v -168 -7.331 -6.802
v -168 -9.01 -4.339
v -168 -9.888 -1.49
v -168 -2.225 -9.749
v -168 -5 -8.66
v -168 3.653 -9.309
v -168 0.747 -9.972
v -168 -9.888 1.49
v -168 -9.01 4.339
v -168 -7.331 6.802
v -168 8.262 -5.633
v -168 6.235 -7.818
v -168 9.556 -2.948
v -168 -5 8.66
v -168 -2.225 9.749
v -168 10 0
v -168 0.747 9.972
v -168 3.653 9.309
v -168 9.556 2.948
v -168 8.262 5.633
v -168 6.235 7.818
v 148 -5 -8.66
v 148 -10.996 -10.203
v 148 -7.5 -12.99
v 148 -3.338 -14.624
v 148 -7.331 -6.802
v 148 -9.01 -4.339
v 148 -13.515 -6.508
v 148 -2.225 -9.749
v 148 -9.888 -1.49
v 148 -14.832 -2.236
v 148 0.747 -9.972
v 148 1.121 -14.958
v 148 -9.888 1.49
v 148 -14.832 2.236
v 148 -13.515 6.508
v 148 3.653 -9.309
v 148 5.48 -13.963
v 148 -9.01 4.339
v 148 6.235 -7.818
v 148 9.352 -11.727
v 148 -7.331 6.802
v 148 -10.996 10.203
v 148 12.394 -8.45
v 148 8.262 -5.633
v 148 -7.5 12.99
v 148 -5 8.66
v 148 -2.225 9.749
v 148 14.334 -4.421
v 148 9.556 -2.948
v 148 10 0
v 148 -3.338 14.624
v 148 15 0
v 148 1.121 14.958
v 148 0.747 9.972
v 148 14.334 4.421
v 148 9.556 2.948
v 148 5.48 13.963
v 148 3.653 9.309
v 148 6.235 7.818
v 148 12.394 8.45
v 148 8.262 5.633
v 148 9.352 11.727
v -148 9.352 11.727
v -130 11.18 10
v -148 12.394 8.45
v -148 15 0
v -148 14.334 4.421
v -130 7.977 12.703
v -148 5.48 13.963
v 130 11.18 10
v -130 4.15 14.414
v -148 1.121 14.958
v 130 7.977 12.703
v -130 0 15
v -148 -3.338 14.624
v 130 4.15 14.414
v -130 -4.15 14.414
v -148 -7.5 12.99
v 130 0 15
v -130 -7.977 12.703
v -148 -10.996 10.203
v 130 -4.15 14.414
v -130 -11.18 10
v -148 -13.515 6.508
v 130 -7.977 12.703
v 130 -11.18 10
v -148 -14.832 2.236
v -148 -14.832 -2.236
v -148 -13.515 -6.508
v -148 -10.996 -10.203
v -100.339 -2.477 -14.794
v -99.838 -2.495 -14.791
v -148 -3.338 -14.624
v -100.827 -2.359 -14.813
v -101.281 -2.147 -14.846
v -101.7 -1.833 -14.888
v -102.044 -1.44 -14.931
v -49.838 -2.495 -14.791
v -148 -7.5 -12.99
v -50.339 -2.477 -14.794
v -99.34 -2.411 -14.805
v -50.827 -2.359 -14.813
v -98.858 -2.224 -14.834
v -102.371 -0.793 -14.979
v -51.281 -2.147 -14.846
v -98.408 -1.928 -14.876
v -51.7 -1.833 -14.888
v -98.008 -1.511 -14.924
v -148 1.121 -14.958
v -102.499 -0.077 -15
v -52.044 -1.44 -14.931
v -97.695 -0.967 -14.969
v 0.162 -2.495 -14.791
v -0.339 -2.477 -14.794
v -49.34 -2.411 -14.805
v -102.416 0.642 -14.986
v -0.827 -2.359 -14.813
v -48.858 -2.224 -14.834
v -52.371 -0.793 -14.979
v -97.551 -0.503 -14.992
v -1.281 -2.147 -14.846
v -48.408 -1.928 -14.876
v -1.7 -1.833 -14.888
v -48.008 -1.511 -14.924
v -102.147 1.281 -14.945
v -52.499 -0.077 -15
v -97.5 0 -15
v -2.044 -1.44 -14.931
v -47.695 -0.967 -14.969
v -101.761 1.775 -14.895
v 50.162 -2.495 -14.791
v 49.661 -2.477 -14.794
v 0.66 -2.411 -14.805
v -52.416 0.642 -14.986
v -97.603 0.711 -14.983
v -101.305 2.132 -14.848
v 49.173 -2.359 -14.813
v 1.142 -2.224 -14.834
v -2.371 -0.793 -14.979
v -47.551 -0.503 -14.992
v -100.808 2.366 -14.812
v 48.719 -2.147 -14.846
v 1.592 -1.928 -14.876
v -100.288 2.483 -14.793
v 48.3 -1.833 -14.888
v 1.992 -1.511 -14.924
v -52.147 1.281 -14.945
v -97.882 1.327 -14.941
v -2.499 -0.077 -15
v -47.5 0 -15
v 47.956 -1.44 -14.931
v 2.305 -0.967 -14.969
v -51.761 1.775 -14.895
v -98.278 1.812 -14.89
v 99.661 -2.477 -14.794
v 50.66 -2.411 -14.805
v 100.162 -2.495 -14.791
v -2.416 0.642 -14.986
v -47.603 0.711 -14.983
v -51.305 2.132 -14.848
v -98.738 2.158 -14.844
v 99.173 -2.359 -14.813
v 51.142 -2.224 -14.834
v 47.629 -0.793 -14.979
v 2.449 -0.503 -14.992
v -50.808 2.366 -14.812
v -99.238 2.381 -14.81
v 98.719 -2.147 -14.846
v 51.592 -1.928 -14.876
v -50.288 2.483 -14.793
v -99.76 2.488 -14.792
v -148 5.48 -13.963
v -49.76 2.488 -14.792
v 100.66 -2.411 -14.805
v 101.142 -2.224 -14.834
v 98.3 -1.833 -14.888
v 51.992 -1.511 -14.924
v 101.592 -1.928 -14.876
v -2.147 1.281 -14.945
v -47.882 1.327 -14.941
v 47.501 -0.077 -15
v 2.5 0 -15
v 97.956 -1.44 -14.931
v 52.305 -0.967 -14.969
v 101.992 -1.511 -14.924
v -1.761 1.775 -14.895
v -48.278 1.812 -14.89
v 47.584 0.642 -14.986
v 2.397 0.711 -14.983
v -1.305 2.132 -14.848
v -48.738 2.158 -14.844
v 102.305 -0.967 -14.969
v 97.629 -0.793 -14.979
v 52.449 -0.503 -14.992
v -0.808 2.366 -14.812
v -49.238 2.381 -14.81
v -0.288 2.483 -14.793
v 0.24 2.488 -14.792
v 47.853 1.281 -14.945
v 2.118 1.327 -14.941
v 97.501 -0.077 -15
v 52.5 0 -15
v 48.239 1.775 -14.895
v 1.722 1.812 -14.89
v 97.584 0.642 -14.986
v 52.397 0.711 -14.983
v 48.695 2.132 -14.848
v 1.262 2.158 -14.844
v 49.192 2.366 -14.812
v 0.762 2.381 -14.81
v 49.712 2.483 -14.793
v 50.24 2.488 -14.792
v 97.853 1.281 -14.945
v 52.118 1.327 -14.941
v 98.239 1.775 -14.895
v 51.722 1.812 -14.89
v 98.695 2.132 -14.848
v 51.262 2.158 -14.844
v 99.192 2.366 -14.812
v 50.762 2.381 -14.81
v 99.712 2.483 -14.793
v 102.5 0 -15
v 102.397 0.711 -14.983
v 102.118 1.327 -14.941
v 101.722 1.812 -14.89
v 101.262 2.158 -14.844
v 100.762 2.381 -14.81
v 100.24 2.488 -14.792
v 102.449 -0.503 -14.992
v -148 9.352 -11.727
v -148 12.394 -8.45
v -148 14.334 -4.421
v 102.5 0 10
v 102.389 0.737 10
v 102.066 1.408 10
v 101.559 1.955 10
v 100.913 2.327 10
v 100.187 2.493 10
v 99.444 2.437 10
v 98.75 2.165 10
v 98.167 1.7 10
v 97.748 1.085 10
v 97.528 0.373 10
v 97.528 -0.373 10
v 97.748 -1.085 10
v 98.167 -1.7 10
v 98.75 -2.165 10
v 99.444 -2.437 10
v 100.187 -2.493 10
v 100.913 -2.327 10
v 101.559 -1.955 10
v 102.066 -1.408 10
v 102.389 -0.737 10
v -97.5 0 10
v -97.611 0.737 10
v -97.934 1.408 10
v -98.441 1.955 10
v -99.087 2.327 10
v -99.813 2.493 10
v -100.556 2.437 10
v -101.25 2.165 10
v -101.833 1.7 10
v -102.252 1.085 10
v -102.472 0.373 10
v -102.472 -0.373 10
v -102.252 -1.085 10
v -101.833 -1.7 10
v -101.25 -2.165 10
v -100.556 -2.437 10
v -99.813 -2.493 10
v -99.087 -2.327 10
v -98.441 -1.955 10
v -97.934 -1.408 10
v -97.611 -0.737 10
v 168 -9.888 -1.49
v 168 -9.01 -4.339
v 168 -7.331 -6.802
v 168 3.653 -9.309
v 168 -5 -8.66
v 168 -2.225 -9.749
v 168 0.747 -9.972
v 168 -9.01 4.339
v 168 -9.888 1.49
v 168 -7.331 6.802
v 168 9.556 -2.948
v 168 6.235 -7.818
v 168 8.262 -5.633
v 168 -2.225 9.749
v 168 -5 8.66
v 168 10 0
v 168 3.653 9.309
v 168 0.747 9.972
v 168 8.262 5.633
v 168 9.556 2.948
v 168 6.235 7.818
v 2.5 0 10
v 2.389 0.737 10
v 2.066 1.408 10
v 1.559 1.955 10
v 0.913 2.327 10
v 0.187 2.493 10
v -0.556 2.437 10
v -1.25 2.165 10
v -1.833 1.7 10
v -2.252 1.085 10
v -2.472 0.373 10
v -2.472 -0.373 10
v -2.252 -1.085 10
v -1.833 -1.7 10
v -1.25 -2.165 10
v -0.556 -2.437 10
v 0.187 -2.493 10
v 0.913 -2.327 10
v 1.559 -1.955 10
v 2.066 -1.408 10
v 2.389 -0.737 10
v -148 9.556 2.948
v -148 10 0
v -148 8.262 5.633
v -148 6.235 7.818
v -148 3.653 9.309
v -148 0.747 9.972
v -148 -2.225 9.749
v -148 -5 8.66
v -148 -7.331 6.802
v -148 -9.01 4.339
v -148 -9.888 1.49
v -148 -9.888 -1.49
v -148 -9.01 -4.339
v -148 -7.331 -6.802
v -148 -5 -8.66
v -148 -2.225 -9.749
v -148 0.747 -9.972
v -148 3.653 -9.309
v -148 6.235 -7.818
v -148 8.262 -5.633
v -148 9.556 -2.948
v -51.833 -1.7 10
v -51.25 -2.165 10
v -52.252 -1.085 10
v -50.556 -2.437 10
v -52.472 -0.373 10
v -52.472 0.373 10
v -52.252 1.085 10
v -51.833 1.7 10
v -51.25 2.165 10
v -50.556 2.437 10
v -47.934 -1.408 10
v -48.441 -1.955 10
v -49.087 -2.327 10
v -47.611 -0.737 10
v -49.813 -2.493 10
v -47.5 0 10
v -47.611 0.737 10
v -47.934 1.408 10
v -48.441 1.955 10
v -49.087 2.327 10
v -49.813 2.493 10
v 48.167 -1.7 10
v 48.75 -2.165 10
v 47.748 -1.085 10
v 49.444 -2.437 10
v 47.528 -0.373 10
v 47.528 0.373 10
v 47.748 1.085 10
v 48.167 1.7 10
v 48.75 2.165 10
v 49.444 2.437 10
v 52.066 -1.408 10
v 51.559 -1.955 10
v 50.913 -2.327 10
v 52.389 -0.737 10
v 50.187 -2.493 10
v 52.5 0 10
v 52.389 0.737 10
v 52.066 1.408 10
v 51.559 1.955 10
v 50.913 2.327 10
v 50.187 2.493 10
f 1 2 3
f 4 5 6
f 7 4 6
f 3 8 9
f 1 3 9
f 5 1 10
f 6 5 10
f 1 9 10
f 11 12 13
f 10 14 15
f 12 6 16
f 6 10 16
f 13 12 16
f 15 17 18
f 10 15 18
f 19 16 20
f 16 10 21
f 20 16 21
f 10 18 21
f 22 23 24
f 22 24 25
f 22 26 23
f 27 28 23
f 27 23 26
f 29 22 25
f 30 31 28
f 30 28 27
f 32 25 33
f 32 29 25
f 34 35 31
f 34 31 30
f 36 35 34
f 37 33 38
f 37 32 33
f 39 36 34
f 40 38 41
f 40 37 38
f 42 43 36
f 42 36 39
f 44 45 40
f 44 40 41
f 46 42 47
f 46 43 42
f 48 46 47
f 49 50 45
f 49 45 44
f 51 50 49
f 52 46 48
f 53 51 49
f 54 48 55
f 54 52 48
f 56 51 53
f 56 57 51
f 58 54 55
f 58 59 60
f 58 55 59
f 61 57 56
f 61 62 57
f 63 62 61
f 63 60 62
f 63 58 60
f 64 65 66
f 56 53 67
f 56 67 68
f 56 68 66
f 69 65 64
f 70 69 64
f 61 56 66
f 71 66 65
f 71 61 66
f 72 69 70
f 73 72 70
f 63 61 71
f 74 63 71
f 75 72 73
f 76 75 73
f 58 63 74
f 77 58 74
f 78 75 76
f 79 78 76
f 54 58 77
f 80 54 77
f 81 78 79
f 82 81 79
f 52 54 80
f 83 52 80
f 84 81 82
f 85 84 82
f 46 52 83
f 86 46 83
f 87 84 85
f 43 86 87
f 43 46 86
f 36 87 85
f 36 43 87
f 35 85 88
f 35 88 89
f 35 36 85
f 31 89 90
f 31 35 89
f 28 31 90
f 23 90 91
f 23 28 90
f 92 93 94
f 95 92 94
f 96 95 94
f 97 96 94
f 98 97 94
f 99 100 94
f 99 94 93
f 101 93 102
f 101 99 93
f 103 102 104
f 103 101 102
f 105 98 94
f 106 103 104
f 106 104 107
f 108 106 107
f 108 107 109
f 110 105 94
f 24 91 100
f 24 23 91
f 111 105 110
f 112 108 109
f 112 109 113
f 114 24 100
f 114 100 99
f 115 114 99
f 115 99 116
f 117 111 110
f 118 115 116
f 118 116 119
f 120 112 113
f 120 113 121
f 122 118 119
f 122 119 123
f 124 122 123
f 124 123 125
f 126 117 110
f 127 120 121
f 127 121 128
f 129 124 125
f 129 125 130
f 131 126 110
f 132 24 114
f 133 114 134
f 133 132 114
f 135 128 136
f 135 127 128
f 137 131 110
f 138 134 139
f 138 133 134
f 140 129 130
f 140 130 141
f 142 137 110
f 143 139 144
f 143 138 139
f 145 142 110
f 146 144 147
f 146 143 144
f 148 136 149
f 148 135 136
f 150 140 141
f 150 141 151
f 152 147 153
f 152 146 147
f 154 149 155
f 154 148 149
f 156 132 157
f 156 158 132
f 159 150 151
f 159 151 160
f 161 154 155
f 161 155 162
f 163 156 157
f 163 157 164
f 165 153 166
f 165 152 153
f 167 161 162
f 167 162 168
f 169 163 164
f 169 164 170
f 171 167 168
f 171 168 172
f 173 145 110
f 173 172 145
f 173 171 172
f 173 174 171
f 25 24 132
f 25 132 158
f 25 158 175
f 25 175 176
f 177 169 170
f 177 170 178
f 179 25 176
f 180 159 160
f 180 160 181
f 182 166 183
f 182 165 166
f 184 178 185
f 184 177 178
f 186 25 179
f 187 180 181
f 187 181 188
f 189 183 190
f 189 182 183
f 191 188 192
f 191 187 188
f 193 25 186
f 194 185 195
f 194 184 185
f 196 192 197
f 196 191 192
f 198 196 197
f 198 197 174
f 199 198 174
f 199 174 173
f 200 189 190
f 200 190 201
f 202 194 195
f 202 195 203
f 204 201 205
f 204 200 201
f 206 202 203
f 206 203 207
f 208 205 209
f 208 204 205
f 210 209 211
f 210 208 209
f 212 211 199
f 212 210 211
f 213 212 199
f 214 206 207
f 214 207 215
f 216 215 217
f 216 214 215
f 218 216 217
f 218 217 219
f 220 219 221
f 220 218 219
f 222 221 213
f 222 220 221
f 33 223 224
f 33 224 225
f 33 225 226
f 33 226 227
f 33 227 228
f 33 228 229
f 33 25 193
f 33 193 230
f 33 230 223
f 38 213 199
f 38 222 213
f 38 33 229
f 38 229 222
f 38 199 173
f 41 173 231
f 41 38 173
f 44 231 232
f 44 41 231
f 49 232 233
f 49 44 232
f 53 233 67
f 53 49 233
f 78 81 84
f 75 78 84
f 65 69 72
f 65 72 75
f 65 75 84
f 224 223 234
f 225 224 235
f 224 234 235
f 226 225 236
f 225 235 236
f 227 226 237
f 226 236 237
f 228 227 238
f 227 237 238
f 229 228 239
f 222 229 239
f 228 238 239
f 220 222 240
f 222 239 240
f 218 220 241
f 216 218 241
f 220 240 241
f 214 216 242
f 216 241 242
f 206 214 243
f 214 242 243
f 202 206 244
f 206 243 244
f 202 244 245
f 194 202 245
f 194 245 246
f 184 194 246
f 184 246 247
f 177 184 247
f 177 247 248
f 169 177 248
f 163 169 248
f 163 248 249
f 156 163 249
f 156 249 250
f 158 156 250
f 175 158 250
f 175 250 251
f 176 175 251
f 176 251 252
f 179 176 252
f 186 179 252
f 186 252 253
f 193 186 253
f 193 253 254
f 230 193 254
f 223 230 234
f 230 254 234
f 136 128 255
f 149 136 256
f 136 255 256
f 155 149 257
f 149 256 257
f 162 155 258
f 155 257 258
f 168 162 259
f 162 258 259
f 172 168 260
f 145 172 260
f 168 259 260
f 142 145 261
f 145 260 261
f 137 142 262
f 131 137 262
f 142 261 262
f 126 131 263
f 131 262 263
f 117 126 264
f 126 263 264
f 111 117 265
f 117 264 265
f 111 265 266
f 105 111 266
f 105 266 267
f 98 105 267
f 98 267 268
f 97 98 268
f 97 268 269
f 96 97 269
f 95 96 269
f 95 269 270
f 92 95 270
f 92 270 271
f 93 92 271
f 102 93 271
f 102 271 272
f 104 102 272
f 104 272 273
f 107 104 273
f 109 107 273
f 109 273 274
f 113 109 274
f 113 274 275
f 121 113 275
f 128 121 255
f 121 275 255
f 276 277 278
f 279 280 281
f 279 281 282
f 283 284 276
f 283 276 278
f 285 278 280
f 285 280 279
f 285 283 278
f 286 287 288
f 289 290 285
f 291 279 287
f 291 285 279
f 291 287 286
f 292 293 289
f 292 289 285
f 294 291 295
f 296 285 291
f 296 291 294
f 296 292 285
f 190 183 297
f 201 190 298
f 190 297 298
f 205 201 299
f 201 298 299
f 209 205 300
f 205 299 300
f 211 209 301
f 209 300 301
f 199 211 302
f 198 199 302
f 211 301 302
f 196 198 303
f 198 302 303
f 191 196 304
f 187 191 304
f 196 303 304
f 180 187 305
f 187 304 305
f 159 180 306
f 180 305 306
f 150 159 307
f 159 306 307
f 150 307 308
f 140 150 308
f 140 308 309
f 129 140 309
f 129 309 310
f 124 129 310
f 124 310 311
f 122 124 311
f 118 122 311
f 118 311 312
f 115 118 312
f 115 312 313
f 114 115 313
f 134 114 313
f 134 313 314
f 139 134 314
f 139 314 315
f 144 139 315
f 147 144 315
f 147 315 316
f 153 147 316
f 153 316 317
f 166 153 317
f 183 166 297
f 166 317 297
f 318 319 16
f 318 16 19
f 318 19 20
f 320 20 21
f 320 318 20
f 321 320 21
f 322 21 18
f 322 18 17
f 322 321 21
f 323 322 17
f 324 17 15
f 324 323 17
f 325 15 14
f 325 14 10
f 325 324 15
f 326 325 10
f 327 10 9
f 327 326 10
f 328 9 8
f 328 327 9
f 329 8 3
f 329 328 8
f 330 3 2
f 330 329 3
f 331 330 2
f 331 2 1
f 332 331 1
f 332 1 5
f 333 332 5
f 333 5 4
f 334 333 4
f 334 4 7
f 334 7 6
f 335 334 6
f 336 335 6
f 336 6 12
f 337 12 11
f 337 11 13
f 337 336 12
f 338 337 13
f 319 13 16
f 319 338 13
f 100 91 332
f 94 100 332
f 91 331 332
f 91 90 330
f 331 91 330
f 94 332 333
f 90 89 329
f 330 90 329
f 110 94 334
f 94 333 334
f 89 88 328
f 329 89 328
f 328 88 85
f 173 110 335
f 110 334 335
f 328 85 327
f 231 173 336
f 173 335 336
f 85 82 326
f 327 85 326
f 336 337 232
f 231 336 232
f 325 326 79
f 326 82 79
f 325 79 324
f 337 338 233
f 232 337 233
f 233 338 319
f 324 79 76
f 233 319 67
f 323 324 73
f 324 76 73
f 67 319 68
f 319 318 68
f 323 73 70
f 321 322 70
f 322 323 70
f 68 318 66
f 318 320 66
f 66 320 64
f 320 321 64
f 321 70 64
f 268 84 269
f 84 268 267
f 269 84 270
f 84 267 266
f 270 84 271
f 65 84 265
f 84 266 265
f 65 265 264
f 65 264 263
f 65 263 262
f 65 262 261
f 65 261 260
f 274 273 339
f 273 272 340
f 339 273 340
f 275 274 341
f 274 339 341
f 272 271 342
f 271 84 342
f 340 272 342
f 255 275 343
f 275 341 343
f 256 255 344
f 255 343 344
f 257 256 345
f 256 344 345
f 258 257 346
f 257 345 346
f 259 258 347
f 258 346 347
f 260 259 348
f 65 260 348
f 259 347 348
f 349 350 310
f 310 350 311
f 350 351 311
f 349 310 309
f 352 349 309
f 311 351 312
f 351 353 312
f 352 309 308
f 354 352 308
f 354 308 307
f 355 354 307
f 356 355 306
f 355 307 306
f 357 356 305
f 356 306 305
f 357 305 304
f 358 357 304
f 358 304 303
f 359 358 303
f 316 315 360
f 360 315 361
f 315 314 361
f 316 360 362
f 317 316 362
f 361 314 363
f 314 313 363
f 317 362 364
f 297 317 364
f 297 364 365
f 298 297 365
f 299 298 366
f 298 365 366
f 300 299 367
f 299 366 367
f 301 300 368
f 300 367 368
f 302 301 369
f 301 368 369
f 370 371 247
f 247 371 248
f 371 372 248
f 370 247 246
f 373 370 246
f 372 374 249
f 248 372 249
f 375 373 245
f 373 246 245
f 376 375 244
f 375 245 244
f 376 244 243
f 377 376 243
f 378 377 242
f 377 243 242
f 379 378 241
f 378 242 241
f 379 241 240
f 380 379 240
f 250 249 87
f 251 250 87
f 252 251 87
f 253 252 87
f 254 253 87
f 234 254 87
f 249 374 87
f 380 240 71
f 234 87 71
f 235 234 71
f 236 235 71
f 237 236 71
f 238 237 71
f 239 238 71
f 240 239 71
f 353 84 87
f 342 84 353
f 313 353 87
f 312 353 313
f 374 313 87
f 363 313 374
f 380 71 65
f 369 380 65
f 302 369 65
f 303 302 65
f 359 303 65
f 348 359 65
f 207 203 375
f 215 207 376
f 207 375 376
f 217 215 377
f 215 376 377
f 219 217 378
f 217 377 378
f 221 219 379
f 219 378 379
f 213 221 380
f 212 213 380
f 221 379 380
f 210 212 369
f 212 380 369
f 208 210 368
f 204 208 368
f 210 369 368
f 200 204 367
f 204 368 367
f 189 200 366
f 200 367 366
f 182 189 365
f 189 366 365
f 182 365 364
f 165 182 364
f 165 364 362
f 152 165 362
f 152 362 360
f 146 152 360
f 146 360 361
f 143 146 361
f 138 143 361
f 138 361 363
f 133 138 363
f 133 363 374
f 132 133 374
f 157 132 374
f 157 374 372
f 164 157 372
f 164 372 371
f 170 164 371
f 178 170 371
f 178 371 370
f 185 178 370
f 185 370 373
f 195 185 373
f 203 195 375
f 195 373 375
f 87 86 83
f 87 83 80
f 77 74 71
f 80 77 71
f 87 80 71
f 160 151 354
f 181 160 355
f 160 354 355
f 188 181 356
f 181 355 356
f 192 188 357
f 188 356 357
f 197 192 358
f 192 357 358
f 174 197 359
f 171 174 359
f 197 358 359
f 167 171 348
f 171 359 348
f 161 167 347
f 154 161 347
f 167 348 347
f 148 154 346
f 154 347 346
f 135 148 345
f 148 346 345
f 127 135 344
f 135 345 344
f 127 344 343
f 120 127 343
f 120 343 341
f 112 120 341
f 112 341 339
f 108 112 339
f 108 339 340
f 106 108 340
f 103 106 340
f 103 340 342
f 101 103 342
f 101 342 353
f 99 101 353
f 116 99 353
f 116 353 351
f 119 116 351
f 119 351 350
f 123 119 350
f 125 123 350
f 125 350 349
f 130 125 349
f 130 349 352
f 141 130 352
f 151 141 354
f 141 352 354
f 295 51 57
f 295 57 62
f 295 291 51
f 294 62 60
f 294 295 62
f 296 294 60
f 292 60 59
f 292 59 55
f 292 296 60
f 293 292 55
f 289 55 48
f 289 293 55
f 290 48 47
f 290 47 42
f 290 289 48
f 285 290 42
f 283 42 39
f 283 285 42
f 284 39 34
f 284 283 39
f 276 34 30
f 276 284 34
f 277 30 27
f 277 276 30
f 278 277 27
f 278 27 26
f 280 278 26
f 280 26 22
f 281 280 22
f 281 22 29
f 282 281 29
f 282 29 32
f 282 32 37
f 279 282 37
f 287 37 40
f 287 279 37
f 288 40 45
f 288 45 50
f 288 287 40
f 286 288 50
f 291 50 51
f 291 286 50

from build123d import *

# Parameters (mm, degrees)
SKETCH_R     = 10
PAD_DEPTH    = 168
SKETCH001_R  = 15
PAD001_DEPTH = 148
SKETCH002_W  = 40
SKETCH002_H  = 15
POCKET_DEPTH = 130
SKETCH003_R  = 2.5
HOLE_DEPTH   = 25
HOLE_TIPS_R  = 2.5


with BuildPart() as part:
    # Sketch → Pad (new body, symmetric)
    with BuildSketch(Plane.YZ):
        Circle(SKETCH_R)
    extrude(amount=PAD_DEPTH, both=True)

    # Sketch001 → Pad001 (join, symmetric)
    with BuildSketch(Plane.YZ):
        Circle(SKETCH001_R)
    extrude(amount=PAD001_DEPTH, both=True)

    # Sketch002 → Pocket (cut, symmetric)
    with BuildSketch(Plane.YZ):
        with Locations((0, 17.5)):
            Rectangle(SKETCH002_W, SKETCH002_H)
    extrude(amount=POCKET_DEPTH, both=True, mode=Mode.SUBTRACT)

    # Sketch003 → Hole (cut)
    with BuildSketch(Plane.XY.offset(10)):
        Circle(SKETCH003_R)
        with Locations((-50, 0)):
            Circle(SKETCH003_R)
        with Locations((-100, 0)):
            Circle(SKETCH003_R)
        with Locations((50, 0)):
            Circle(SKETCH003_R)
        with Locations((100, 0)):
            Circle(SKETCH003_R)
    extrude(amount=-HOLE_DEPTH, mode=Mode.SUBTRACT)

    # Hole tips → Hole tip 1 section 0
    with BuildSketch(Plane.XY.offset(-15), mode=Mode.PRIVATE) as hole_tip_1_s0:
        Circle(HOLE_TIPS_R)
    loft([hole_tip_1_s0.sketch, Vertex(0, 0, -16.502152)], mode=Mode.SUBTRACT)

    # Hole tips → Hole tip 2 section 0
    with BuildSketch(Plane.XY.offset(-15), mode=Mode.PRIVATE) as hole_tip_2_s0:
        with Locations((-50, 0)):
            Circle(HOLE_TIPS_R)
    loft([hole_tip_2_s0.sketch, Vertex(-50, 0, -16.502152)], mode=Mode.SUBTRACT)

    # Hole tips → Hole tip 3 section 0
    with BuildSketch(Plane.XY.offset(-15), mode=Mode.PRIVATE) as hole_tip_3_s0:
        with Locations((-100, 0)):
            Circle(HOLE_TIPS_R)
    loft([hole_tip_3_s0.sketch, Vertex(-100, 0, -16.502152)], mode=Mode.SUBTRACT)

    # Hole tips → Hole tip 4 section 0
    with BuildSketch(Plane.XY.offset(-15), mode=Mode.PRIVATE) as hole_tip_4_s0:
        with Locations((50, 0)):
            Circle(HOLE_TIPS_R)
    loft([hole_tip_4_s0.sketch, Vertex(50, 0, -16.502152)], mode=Mode.SUBTRACT)

    # Hole tips → Hole tip 5 section 0
    with BuildSketch(Plane.XY.offset(-15), mode=Mode.PRIVATE) as hole_tip_5_s0:
        with Locations((100, 0)):
            Circle(HOLE_TIPS_R)
    loft([hole_tip_5_s0.sketch, Vertex(100, 0, -16.502152)], mode=Mode.SUBTRACT)


solid = part.part
